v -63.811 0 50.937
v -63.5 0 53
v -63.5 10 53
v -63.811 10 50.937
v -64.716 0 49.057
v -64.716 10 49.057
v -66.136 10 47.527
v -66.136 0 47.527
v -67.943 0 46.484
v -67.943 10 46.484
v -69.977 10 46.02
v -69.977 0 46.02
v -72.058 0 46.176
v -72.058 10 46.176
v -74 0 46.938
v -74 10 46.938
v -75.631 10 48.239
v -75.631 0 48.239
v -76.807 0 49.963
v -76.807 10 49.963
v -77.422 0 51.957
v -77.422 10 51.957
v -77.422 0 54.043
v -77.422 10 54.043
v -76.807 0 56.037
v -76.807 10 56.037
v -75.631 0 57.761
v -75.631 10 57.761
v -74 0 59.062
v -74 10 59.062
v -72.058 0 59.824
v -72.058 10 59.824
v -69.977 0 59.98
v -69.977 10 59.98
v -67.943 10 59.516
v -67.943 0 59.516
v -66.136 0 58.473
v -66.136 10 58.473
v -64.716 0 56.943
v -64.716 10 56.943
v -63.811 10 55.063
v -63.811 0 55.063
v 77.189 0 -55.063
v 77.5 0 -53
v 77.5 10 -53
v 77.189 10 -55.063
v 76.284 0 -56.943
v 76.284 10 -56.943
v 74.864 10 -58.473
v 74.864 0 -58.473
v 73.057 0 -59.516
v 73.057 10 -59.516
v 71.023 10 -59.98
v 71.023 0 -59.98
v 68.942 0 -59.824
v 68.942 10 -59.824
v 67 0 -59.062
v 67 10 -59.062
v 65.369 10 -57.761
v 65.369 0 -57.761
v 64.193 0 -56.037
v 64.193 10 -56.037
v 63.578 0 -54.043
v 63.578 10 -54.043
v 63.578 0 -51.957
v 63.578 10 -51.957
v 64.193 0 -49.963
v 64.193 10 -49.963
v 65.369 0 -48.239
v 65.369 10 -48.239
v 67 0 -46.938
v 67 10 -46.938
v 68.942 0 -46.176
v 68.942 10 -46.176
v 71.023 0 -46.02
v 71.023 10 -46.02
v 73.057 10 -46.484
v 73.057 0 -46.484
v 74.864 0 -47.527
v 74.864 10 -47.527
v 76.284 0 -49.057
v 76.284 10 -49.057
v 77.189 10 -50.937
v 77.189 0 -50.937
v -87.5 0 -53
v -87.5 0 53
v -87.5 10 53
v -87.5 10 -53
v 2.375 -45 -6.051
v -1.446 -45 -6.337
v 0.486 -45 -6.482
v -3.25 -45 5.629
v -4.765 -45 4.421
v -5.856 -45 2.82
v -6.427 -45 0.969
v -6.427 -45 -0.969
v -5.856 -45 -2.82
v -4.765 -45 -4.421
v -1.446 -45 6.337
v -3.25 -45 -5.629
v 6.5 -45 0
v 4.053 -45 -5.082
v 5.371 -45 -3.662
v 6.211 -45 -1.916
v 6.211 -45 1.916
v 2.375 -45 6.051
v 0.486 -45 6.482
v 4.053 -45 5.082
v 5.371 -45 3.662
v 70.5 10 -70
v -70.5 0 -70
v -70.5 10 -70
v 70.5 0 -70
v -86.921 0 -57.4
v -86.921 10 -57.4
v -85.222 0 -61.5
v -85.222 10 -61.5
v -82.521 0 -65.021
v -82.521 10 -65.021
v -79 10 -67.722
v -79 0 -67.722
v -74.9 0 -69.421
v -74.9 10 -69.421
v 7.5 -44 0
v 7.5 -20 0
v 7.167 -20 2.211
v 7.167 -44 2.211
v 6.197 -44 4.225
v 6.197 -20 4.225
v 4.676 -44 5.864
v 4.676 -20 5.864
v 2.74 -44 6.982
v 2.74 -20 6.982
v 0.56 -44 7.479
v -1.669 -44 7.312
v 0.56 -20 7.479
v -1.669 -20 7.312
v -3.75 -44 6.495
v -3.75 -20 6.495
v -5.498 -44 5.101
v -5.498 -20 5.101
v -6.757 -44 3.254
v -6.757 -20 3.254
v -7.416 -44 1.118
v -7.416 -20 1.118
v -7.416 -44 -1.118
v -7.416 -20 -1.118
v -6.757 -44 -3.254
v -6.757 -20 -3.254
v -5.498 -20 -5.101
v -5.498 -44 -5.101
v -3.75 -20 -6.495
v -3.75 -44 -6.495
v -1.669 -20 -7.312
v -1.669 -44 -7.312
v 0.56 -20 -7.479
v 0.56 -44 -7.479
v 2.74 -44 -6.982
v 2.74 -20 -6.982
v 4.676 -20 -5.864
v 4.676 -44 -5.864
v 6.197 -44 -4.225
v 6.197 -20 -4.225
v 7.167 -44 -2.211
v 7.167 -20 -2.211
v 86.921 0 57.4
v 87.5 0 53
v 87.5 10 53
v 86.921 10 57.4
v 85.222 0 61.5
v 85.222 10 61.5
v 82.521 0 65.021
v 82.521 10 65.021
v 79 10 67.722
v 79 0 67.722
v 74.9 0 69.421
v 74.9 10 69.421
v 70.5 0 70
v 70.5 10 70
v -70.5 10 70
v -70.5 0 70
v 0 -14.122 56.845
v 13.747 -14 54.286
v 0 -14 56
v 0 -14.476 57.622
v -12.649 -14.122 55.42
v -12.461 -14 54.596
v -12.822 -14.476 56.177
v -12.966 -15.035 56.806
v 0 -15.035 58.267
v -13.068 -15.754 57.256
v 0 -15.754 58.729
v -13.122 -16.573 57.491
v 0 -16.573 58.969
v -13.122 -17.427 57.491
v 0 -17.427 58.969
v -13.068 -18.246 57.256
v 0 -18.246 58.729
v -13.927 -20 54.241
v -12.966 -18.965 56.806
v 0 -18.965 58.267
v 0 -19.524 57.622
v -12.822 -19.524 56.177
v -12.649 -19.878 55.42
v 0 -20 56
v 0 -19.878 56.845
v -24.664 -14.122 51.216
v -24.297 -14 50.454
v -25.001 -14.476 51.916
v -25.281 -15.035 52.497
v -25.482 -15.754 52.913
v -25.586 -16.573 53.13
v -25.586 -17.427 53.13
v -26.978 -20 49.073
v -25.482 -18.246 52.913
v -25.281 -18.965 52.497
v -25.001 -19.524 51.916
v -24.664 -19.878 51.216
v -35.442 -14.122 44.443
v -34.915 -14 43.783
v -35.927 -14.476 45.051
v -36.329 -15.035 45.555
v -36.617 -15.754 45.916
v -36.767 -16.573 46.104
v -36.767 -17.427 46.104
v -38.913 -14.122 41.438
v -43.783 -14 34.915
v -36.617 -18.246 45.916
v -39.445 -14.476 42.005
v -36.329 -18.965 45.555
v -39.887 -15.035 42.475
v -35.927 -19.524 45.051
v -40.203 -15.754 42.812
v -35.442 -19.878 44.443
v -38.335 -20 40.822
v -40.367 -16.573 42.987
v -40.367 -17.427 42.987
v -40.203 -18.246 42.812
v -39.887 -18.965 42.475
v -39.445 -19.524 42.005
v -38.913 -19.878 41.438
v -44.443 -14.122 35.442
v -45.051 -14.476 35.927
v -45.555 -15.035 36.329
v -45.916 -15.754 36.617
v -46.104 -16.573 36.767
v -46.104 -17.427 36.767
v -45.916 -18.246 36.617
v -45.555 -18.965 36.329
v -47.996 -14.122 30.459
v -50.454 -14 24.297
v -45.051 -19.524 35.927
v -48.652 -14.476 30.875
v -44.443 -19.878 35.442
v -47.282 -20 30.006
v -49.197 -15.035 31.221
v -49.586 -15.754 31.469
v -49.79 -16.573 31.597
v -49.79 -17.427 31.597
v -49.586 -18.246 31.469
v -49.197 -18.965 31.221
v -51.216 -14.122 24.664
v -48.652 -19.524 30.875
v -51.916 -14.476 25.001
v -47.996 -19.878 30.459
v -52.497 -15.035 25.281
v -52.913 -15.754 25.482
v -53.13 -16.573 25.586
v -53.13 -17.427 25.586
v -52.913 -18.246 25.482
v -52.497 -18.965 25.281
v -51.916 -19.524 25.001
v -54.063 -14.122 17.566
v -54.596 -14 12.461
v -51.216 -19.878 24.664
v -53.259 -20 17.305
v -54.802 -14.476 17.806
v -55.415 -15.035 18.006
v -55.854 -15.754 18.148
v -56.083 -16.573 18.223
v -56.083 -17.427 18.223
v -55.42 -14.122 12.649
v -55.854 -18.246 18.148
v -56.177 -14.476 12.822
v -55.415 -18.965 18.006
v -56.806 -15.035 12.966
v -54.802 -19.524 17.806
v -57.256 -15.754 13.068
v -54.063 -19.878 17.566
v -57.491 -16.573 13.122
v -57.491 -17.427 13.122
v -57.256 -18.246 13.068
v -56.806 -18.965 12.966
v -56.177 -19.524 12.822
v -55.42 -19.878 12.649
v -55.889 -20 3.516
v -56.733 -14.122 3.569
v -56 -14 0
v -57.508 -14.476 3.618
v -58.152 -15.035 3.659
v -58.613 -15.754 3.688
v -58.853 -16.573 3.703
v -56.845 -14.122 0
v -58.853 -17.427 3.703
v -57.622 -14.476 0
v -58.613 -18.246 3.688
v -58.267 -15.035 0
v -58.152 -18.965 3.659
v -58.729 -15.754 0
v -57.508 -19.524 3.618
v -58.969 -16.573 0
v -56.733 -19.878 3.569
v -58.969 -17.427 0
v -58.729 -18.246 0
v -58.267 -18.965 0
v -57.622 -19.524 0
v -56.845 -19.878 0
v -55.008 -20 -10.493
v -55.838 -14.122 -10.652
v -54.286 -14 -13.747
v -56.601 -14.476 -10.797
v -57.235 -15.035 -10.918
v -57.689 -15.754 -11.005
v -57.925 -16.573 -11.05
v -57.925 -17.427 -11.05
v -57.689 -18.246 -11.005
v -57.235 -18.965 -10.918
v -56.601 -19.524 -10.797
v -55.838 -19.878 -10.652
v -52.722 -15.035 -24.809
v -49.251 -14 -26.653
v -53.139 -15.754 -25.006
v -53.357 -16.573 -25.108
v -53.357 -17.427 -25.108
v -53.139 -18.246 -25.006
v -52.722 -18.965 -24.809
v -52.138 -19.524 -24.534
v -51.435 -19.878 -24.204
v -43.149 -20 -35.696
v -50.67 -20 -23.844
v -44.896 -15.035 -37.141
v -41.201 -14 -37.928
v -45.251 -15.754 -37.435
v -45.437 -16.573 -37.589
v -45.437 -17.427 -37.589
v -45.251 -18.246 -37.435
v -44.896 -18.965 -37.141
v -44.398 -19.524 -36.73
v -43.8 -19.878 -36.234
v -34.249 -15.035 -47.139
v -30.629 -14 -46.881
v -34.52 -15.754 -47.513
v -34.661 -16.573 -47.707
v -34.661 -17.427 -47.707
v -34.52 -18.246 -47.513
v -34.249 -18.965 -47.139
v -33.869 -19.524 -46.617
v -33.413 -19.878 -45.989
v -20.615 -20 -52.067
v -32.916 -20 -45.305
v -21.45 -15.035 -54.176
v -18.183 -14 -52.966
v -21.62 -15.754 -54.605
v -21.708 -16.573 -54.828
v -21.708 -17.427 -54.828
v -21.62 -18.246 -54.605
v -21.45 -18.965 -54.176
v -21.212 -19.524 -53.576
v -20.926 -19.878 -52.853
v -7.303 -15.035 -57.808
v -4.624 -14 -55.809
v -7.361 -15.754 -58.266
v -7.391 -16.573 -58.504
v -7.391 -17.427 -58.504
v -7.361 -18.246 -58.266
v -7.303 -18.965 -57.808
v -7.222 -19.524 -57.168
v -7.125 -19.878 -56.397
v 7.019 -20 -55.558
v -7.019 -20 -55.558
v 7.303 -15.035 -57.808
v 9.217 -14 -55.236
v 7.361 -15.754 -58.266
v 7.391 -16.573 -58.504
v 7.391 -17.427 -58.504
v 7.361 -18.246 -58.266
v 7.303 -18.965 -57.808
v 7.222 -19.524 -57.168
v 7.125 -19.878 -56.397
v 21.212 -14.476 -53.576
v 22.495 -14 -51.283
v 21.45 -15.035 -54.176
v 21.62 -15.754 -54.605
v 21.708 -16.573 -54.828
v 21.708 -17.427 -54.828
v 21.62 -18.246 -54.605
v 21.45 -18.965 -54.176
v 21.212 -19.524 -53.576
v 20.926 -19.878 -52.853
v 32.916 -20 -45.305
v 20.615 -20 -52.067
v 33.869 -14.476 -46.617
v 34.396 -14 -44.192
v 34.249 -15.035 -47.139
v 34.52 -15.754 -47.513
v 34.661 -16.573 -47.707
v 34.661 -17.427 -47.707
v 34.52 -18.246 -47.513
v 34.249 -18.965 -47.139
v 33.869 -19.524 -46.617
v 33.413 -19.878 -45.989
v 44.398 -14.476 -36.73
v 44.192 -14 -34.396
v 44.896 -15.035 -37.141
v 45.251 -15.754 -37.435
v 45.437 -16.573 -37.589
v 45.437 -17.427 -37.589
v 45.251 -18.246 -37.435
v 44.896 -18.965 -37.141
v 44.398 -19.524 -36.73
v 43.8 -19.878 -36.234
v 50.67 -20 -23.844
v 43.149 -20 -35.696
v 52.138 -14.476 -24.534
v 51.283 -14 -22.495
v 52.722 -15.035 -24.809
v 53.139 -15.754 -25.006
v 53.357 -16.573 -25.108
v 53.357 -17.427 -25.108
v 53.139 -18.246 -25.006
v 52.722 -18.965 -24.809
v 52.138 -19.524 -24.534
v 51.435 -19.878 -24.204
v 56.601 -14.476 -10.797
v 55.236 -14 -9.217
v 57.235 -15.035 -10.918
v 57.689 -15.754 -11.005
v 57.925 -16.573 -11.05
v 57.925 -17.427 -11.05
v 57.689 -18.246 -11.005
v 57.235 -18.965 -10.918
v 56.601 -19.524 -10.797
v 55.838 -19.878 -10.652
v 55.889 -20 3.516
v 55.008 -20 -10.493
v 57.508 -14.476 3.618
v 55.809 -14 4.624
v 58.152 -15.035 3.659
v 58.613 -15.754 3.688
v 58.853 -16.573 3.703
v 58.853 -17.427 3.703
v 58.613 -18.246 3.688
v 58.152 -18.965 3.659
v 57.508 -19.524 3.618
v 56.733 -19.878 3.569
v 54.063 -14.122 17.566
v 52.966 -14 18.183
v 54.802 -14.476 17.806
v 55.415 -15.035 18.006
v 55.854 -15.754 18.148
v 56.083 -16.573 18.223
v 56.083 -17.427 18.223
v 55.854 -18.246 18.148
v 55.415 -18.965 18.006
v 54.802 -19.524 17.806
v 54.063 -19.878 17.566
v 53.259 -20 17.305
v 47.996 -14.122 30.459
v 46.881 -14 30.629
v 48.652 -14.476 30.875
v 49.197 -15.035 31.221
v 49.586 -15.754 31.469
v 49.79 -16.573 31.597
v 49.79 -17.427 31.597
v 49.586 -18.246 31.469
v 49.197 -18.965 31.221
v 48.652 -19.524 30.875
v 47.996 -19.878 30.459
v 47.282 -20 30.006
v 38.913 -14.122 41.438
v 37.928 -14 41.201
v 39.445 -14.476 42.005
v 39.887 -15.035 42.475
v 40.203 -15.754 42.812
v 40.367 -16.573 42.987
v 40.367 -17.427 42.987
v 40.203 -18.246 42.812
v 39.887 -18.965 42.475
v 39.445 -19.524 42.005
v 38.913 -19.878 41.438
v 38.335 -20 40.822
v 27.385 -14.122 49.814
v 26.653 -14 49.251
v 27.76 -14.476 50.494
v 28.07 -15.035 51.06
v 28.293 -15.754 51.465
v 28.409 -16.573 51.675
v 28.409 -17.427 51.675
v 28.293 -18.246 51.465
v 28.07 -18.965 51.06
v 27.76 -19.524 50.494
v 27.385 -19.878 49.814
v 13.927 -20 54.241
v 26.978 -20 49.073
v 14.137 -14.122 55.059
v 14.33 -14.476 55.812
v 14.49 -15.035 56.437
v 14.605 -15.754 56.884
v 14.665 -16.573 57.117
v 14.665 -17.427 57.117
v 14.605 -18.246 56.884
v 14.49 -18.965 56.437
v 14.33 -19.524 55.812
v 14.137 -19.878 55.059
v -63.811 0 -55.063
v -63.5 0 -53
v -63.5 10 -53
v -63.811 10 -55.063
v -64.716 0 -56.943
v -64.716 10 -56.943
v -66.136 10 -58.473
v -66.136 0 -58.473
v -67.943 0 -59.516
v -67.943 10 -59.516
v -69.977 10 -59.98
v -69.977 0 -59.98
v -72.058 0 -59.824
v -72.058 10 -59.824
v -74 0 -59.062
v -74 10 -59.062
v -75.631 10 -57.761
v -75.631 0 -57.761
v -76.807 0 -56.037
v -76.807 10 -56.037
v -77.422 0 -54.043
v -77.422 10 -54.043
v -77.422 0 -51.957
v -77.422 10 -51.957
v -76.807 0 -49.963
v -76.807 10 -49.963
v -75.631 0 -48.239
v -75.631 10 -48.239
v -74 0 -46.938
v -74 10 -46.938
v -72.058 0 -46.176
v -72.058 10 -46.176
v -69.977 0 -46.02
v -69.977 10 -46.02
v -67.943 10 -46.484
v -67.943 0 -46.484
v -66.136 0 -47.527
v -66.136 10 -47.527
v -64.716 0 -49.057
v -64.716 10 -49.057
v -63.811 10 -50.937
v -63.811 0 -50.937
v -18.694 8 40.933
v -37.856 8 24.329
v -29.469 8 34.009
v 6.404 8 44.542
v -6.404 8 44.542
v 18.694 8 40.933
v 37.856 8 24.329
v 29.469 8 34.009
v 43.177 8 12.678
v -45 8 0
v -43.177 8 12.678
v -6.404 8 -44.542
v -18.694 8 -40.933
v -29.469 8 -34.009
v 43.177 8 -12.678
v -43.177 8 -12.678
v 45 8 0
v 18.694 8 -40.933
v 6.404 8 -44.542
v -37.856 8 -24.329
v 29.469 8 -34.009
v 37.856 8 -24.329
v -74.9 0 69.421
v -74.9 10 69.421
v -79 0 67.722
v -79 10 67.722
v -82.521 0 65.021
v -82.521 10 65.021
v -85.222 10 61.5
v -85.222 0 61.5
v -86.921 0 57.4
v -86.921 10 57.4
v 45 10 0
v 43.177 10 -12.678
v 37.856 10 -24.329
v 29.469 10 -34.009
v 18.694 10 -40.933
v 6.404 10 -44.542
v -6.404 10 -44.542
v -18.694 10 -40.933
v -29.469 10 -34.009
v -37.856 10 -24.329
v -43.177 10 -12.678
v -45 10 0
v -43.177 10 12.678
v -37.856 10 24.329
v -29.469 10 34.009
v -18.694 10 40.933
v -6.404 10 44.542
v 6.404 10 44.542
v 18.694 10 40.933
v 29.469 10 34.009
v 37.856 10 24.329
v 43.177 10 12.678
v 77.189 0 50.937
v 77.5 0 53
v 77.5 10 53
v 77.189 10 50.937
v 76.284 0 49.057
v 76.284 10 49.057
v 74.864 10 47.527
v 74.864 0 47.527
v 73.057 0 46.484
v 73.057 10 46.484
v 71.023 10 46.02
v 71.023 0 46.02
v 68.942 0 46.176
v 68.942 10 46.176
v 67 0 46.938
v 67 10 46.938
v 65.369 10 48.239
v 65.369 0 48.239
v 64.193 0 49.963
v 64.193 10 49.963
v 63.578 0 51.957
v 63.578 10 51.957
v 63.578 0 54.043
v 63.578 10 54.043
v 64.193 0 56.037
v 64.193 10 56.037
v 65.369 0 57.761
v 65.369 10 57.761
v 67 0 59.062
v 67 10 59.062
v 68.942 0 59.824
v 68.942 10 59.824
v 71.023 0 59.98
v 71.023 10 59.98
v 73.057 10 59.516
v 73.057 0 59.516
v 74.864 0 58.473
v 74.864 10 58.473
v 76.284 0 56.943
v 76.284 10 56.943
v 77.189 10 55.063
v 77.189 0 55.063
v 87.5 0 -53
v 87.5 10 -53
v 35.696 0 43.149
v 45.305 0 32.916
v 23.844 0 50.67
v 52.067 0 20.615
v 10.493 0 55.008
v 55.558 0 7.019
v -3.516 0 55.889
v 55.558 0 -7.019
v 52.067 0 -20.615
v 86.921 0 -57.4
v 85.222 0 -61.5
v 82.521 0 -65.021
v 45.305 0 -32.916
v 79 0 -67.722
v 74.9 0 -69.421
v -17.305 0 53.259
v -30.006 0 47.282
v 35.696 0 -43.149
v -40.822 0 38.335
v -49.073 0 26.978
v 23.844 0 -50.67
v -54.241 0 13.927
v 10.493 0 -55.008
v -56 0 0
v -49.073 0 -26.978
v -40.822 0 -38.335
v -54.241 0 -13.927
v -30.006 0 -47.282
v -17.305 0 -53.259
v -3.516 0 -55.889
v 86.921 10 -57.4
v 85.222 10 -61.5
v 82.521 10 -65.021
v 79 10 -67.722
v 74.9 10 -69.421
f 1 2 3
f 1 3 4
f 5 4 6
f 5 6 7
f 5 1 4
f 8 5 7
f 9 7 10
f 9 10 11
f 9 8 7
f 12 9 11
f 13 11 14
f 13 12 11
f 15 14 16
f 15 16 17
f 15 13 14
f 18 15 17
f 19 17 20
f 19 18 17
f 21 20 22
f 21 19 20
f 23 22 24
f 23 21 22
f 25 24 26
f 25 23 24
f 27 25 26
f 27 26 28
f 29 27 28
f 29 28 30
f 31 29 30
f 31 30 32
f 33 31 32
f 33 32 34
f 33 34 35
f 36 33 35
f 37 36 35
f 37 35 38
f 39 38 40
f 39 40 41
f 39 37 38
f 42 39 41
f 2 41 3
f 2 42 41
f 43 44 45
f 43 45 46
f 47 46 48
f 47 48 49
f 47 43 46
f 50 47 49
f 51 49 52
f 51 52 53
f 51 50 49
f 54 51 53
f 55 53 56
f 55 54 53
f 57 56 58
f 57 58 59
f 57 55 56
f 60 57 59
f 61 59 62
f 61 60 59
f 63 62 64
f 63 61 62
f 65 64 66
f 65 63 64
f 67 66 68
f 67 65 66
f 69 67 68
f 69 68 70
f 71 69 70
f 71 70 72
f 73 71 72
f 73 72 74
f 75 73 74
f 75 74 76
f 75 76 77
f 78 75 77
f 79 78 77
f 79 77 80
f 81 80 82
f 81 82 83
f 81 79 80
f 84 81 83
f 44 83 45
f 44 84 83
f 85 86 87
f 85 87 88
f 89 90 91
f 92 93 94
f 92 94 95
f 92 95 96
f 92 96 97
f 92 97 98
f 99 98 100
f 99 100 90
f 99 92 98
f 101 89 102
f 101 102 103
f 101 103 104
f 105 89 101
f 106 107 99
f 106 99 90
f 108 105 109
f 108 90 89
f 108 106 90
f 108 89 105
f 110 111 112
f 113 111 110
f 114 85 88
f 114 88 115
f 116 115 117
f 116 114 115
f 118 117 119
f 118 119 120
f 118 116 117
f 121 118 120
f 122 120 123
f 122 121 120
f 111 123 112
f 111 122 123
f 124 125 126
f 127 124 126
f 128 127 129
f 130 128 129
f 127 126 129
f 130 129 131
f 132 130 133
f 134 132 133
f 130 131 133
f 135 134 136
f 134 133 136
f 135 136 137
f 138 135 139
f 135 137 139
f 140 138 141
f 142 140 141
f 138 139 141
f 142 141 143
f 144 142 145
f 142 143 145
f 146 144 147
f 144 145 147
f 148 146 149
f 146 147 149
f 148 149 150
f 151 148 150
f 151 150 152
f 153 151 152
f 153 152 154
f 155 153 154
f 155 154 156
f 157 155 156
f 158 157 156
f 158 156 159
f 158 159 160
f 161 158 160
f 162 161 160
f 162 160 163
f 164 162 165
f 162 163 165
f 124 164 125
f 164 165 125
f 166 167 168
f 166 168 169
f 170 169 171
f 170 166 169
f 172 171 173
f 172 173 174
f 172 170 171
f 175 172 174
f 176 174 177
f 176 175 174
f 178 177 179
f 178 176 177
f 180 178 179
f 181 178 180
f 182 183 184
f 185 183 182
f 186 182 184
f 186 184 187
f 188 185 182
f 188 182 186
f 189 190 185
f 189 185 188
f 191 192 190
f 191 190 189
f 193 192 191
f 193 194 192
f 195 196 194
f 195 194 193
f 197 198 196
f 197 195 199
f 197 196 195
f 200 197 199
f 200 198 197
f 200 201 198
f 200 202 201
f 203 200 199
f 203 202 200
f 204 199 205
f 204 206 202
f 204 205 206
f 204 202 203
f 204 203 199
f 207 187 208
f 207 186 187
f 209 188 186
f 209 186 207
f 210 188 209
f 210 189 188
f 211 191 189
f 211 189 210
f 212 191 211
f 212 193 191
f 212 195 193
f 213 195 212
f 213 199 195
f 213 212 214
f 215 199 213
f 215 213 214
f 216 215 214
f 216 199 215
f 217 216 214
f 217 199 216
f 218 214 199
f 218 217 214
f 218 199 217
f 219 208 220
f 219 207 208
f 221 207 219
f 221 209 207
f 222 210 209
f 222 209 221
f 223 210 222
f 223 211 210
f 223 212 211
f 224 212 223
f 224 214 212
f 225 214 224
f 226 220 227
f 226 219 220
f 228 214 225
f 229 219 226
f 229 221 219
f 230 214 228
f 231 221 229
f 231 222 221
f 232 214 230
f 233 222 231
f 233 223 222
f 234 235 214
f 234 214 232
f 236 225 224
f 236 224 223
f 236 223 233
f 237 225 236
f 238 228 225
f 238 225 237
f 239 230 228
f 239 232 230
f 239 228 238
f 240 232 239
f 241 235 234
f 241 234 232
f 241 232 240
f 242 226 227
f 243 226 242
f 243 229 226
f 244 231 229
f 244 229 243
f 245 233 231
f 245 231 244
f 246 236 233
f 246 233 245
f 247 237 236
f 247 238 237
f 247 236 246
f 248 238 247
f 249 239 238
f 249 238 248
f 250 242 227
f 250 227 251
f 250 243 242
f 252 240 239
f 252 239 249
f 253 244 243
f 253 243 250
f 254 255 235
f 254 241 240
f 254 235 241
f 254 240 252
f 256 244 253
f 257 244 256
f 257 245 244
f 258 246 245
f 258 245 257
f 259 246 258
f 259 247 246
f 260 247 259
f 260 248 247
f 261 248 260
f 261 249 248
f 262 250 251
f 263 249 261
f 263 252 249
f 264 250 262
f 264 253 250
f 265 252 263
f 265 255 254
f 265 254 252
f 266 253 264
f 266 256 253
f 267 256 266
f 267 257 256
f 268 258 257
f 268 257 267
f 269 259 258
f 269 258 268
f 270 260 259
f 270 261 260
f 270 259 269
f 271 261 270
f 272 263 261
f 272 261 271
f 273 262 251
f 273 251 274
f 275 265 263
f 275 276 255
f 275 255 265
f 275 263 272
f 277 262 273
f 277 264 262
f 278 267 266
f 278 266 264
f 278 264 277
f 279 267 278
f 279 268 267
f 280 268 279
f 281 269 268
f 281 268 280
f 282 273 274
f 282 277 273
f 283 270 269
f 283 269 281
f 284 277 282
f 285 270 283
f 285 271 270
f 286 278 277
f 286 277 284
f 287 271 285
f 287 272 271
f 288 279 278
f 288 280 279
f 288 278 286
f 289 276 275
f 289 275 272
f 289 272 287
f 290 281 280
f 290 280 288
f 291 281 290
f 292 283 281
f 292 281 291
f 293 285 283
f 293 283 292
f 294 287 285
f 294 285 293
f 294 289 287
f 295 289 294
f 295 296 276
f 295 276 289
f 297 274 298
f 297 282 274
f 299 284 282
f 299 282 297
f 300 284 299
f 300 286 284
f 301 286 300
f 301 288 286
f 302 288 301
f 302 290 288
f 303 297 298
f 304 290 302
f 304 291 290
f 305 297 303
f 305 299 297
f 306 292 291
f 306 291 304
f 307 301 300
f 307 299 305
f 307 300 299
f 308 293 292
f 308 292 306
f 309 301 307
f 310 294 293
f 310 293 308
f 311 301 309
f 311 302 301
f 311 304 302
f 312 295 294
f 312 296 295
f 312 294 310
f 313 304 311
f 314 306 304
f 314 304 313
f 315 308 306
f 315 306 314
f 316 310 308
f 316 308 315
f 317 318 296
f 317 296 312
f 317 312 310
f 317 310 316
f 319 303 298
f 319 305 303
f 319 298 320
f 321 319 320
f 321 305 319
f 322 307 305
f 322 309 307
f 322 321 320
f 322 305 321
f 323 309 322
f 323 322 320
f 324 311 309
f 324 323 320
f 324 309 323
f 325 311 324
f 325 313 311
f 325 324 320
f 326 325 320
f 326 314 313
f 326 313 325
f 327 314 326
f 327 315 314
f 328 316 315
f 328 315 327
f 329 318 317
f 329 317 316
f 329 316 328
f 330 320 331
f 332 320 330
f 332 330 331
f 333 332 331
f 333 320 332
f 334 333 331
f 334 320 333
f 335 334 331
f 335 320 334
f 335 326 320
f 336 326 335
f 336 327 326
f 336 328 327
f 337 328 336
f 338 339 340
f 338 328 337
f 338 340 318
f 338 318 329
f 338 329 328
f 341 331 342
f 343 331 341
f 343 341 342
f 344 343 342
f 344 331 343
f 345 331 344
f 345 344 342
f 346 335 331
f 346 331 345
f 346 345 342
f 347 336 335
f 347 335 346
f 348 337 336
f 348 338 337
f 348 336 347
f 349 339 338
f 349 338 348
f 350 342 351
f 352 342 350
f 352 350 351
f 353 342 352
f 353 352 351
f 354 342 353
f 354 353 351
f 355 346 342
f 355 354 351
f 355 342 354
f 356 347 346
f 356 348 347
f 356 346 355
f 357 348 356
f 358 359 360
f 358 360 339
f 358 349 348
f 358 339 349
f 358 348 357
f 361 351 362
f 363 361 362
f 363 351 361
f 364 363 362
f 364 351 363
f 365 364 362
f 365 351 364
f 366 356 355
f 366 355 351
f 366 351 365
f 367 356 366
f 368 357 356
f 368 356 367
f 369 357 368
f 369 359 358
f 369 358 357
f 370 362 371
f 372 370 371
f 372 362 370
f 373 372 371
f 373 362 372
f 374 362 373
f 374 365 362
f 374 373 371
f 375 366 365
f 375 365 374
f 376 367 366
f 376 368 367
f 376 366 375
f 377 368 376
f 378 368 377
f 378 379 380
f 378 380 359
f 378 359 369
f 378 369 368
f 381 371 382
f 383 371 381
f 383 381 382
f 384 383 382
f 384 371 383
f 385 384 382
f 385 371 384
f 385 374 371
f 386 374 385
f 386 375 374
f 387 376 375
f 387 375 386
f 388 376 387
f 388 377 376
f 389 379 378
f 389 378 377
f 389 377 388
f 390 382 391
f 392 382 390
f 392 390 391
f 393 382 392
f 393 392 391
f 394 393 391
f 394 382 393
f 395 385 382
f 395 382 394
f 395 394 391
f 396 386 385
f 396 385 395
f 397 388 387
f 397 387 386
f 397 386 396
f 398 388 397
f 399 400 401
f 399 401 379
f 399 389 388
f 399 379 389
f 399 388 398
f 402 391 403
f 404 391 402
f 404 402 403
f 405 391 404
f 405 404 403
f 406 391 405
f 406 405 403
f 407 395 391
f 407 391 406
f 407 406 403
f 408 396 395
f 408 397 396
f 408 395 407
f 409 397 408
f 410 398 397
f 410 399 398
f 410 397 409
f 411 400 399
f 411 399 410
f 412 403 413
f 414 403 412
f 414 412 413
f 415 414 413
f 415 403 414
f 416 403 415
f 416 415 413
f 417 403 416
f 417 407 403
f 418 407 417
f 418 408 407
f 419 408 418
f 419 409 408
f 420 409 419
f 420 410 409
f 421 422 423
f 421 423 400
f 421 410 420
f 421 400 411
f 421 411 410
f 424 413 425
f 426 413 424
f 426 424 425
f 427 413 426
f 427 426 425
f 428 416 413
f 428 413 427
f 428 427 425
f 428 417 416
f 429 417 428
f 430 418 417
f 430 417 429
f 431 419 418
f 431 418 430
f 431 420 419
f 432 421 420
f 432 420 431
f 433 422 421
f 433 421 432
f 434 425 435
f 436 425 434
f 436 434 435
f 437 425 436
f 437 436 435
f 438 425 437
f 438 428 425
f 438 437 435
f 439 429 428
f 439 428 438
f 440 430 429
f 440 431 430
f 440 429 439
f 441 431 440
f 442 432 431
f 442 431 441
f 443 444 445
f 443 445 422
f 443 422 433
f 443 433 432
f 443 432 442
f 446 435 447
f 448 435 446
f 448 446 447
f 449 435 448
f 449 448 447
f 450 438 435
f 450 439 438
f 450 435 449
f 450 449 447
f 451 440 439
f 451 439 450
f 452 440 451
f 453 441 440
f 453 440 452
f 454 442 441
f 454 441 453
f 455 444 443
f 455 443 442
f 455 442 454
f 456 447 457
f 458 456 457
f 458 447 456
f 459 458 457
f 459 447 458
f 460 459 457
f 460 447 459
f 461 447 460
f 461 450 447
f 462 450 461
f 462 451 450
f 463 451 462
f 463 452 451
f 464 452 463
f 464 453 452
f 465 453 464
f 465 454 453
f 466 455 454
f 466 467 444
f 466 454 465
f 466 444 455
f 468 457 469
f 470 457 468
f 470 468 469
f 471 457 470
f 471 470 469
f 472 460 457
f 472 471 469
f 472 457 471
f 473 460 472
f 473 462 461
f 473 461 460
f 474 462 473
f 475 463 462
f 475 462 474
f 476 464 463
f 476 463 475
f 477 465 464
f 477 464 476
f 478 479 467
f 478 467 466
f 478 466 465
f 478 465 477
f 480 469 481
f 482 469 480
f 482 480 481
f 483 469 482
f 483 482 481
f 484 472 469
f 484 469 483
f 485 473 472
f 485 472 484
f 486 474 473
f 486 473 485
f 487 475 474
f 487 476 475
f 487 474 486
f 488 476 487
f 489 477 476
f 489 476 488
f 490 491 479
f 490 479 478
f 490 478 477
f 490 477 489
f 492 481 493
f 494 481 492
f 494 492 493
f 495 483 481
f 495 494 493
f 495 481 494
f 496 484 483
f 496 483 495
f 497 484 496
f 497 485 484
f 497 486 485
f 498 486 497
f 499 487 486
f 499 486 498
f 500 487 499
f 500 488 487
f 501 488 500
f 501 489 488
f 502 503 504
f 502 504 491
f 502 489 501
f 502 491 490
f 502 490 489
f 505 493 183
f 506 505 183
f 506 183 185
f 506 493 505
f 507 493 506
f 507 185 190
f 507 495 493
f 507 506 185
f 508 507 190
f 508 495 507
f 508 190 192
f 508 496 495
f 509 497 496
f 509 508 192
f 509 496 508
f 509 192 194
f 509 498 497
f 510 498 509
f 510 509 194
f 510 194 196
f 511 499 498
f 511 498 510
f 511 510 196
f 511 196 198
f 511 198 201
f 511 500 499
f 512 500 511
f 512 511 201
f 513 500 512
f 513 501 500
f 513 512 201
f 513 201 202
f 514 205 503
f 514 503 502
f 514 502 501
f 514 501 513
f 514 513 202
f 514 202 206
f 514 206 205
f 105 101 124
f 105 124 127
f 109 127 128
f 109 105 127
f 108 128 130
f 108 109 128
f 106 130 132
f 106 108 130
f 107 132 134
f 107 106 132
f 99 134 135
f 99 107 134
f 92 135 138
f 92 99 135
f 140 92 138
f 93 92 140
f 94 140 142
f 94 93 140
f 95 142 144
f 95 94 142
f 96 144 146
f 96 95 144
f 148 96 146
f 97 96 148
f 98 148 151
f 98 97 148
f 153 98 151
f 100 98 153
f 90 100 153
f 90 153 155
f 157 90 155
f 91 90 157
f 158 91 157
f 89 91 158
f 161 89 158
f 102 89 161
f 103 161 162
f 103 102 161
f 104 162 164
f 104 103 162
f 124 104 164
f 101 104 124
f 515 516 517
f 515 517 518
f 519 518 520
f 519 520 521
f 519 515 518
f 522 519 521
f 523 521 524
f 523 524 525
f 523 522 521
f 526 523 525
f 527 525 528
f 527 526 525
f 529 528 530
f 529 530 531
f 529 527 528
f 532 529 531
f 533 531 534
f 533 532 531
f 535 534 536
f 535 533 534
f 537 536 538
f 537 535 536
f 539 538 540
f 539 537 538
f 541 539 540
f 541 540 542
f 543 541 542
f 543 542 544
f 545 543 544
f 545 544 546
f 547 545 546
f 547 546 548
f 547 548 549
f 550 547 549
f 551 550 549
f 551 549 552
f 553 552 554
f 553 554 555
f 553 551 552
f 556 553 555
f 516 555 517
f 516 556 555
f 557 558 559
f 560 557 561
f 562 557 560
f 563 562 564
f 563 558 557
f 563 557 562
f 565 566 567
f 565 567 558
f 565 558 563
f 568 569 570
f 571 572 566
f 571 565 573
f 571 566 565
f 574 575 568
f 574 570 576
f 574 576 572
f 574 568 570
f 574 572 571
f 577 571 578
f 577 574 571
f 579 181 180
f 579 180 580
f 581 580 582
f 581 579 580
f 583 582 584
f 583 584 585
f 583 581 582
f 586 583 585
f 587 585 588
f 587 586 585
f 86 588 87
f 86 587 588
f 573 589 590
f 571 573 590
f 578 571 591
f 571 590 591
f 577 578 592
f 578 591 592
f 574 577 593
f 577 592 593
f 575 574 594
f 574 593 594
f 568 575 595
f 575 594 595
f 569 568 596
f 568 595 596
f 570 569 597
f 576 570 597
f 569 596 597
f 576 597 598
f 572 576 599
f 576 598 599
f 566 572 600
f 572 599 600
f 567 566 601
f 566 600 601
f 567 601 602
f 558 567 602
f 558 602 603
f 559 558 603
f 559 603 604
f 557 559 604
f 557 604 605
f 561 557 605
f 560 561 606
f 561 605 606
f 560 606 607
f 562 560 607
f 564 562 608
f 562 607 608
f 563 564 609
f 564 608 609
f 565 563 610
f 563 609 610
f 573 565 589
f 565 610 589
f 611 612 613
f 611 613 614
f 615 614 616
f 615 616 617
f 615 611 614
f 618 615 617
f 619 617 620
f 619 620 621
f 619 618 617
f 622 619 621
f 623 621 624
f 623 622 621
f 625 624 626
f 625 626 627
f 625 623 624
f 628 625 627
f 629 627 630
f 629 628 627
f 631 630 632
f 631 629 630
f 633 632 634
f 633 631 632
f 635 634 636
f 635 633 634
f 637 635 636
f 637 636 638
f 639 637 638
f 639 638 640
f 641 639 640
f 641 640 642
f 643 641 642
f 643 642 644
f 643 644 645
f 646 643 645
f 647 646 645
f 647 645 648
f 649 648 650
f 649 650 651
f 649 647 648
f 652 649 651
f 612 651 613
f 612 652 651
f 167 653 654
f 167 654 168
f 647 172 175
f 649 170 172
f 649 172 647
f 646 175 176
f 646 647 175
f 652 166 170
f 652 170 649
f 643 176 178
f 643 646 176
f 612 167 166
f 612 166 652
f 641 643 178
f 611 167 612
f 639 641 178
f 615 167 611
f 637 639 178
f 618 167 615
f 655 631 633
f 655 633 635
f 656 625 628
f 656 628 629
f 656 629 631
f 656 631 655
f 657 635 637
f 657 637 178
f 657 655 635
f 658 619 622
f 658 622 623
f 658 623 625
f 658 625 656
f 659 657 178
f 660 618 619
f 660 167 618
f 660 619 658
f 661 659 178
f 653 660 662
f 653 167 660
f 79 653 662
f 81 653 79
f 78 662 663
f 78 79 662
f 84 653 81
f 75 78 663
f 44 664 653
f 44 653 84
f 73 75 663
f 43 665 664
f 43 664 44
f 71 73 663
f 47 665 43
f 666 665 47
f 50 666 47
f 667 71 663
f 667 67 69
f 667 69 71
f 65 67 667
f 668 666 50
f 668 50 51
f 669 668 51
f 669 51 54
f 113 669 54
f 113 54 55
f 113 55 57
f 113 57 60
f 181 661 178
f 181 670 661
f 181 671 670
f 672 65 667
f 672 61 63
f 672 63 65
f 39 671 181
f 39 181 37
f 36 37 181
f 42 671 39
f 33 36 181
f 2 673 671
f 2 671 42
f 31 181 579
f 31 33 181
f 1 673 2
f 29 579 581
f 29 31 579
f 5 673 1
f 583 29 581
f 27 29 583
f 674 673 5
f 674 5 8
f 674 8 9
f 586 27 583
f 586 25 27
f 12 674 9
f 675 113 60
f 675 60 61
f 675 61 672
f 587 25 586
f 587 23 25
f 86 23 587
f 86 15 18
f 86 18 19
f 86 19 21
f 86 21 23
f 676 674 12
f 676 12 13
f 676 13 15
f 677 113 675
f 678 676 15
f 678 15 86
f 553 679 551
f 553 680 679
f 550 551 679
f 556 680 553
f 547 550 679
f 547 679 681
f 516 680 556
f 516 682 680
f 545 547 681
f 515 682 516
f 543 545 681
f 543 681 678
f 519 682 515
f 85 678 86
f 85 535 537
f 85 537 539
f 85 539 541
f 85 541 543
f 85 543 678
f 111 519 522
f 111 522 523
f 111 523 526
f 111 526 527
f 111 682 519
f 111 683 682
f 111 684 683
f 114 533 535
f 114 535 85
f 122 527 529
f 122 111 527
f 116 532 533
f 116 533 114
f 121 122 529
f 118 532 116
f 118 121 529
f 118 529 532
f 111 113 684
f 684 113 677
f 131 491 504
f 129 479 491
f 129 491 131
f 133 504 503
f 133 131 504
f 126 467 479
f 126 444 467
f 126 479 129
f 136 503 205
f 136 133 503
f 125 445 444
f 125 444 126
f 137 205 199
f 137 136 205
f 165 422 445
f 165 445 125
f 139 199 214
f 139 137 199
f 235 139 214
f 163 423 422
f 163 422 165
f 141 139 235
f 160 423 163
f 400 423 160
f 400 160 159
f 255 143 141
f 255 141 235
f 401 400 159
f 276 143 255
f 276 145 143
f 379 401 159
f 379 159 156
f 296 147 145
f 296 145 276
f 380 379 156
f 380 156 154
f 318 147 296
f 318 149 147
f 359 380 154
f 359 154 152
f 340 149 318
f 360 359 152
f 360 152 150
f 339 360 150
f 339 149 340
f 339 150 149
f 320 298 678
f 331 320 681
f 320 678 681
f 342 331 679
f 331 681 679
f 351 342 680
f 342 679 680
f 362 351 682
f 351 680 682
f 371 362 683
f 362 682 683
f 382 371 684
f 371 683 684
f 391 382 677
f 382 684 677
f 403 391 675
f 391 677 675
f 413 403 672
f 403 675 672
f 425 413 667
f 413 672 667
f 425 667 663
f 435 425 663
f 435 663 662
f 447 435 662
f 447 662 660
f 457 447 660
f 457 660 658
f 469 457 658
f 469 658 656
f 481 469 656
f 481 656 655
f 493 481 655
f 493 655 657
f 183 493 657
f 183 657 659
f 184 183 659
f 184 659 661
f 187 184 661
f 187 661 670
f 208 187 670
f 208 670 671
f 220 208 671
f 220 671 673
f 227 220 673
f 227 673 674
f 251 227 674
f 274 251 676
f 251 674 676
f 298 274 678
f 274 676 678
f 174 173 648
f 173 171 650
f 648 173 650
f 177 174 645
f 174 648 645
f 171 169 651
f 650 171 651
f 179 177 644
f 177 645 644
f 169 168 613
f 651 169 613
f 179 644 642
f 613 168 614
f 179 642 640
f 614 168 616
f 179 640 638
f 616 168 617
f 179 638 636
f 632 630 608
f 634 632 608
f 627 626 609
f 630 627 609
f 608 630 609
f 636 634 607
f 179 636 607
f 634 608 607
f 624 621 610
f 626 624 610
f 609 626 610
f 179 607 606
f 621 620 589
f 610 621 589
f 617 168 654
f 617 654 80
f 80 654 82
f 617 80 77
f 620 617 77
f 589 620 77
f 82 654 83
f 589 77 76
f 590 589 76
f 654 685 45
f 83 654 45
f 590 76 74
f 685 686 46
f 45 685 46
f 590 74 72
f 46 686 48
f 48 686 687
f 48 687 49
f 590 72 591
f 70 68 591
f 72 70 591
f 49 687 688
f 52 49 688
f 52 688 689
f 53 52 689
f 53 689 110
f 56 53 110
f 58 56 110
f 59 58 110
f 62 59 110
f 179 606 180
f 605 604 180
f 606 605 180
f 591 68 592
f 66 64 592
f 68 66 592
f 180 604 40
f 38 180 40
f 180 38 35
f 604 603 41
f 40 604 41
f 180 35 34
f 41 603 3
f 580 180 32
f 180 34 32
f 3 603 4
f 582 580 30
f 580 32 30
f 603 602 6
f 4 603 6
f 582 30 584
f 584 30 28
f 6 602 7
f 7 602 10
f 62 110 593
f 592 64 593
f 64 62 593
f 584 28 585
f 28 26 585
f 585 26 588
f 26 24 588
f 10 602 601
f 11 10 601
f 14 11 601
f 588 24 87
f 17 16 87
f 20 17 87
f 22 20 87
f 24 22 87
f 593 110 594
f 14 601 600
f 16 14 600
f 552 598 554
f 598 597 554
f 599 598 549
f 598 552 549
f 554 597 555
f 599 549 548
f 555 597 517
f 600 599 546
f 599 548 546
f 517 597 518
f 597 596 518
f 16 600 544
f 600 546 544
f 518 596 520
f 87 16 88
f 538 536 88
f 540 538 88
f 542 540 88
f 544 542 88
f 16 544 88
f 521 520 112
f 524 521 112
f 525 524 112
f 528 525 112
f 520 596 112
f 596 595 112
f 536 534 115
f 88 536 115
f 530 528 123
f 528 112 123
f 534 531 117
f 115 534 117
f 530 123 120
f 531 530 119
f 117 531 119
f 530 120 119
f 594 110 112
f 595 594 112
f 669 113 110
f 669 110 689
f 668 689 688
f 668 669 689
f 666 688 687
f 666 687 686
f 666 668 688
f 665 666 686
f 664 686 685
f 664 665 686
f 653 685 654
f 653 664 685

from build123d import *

# Parameters (mm, degrees)
SKETCH1_R           = 7
BOSS_EXTRUDE2_DEPTH = 10
SKETCH3_R           = 56
BOSS_EXTRUDE4_DEPTH = 20
SKETCH5_R           = 3
SKETCH6_R           = 7.5
BOSS_EXTRUDE5_DEPTH = 25
CHAMFER1_SIZE       = 1
SKETCH7_R           = 45
CUT_EXTRUDE2_DEPTH  = 2


with BuildPart() as part:
    # Sketch1 → Boss-Extrude2 (new body)
    with BuildSketch(Plane(origin=(0, 0, 0), x_dir=(1, 0, 0), z_dir=(0, 1, 0))):
        with BuildLine():
            Line((-70.5, 70), (70.5, 70))
            ThreePointArc((70.5, 70), (82.52081528, 65.02081528), (87.5, 53))
            Line((87.5, 53), (87.5, -53))
            ThreePointArc((87.5, -53), (82.52081528, -65.02081528), (70.5, -70))
            Line((70.5, -70), (-70.5, -70))
            ThreePointArc((-70.5, -70), (-82.52081528, -65.02081528), (-87.5, -53))
            Line((-87.5, -53), (-87.5, 53))
            ThreePointArc((-87.5, 53), (-82.52081528, 65.02081528), (-70.5, 70))
        make_face()
        with Locations((-70.5, 53)):
            Circle(SKETCH1_R, mode=Mode.SUBTRACT)
        with Locations((70.5, 53)):
            Circle(SKETCH1_R, mode=Mode.SUBTRACT)
        with Locations((70.5, -53)):
            Circle(SKETCH1_R, mode=Mode.SUBTRACT)
        with Locations((-70.5, -53)):
            Circle(SKETCH1_R, mode=Mode.SUBTRACT)
    extrude(amount=BOSS_EXTRUDE2_DEPTH)

    # Sketch3 → Boss-Extrude4 (add)
    with BuildSketch(Plane(origin=(0, 0, 0), x_dir=(-1, 0, 0), z_dir=(0, -1, 0))):
        Circle(SKETCH3_R)
    extrude(amount=BOSS_EXTRUDE4_DEPTH)

    # Sketch5 → Revolve1 (revolve)
    with BuildSketch(Plane(origin=(0, 0, 0), x_dir=(0, 0, -1), z_dir=(1, 0, 0))):
        with Locations((-56, -17)):
            Circle(SKETCH5_R)
    revolve(axis=Axis((0, 0, 0), (0, -1, 0)))

    # Sketch6 → Boss-Extrude5 (add)
    with BuildSketch(Plane.XZ.offset(20)):
        Circle(SKETCH6_R)
    extrude(amount=BOSS_EXTRUDE5_DEPTH)

    # Chamfer1
    chamfer1_edges = [part.edges().sort_by_distance(p)[0] for p in [
        (-7.5, -45, 0),
    ]]
    chamfer(chamfer1_edges, length=CHAMFER1_SIZE)

    # Sketch7 → Cut-Extrude2 (cut)
    with BuildSketch(Plane(origin=(0, 10, 0), x_dir=(1, 0, 0), z_dir=(0, 1, 0))):
        Circle(SKETCH7_R)
    extrude(amount=-CUT_EXTRUDE2_DEPTH, mode=Mode.SUBTRACT)


solid = part.part
